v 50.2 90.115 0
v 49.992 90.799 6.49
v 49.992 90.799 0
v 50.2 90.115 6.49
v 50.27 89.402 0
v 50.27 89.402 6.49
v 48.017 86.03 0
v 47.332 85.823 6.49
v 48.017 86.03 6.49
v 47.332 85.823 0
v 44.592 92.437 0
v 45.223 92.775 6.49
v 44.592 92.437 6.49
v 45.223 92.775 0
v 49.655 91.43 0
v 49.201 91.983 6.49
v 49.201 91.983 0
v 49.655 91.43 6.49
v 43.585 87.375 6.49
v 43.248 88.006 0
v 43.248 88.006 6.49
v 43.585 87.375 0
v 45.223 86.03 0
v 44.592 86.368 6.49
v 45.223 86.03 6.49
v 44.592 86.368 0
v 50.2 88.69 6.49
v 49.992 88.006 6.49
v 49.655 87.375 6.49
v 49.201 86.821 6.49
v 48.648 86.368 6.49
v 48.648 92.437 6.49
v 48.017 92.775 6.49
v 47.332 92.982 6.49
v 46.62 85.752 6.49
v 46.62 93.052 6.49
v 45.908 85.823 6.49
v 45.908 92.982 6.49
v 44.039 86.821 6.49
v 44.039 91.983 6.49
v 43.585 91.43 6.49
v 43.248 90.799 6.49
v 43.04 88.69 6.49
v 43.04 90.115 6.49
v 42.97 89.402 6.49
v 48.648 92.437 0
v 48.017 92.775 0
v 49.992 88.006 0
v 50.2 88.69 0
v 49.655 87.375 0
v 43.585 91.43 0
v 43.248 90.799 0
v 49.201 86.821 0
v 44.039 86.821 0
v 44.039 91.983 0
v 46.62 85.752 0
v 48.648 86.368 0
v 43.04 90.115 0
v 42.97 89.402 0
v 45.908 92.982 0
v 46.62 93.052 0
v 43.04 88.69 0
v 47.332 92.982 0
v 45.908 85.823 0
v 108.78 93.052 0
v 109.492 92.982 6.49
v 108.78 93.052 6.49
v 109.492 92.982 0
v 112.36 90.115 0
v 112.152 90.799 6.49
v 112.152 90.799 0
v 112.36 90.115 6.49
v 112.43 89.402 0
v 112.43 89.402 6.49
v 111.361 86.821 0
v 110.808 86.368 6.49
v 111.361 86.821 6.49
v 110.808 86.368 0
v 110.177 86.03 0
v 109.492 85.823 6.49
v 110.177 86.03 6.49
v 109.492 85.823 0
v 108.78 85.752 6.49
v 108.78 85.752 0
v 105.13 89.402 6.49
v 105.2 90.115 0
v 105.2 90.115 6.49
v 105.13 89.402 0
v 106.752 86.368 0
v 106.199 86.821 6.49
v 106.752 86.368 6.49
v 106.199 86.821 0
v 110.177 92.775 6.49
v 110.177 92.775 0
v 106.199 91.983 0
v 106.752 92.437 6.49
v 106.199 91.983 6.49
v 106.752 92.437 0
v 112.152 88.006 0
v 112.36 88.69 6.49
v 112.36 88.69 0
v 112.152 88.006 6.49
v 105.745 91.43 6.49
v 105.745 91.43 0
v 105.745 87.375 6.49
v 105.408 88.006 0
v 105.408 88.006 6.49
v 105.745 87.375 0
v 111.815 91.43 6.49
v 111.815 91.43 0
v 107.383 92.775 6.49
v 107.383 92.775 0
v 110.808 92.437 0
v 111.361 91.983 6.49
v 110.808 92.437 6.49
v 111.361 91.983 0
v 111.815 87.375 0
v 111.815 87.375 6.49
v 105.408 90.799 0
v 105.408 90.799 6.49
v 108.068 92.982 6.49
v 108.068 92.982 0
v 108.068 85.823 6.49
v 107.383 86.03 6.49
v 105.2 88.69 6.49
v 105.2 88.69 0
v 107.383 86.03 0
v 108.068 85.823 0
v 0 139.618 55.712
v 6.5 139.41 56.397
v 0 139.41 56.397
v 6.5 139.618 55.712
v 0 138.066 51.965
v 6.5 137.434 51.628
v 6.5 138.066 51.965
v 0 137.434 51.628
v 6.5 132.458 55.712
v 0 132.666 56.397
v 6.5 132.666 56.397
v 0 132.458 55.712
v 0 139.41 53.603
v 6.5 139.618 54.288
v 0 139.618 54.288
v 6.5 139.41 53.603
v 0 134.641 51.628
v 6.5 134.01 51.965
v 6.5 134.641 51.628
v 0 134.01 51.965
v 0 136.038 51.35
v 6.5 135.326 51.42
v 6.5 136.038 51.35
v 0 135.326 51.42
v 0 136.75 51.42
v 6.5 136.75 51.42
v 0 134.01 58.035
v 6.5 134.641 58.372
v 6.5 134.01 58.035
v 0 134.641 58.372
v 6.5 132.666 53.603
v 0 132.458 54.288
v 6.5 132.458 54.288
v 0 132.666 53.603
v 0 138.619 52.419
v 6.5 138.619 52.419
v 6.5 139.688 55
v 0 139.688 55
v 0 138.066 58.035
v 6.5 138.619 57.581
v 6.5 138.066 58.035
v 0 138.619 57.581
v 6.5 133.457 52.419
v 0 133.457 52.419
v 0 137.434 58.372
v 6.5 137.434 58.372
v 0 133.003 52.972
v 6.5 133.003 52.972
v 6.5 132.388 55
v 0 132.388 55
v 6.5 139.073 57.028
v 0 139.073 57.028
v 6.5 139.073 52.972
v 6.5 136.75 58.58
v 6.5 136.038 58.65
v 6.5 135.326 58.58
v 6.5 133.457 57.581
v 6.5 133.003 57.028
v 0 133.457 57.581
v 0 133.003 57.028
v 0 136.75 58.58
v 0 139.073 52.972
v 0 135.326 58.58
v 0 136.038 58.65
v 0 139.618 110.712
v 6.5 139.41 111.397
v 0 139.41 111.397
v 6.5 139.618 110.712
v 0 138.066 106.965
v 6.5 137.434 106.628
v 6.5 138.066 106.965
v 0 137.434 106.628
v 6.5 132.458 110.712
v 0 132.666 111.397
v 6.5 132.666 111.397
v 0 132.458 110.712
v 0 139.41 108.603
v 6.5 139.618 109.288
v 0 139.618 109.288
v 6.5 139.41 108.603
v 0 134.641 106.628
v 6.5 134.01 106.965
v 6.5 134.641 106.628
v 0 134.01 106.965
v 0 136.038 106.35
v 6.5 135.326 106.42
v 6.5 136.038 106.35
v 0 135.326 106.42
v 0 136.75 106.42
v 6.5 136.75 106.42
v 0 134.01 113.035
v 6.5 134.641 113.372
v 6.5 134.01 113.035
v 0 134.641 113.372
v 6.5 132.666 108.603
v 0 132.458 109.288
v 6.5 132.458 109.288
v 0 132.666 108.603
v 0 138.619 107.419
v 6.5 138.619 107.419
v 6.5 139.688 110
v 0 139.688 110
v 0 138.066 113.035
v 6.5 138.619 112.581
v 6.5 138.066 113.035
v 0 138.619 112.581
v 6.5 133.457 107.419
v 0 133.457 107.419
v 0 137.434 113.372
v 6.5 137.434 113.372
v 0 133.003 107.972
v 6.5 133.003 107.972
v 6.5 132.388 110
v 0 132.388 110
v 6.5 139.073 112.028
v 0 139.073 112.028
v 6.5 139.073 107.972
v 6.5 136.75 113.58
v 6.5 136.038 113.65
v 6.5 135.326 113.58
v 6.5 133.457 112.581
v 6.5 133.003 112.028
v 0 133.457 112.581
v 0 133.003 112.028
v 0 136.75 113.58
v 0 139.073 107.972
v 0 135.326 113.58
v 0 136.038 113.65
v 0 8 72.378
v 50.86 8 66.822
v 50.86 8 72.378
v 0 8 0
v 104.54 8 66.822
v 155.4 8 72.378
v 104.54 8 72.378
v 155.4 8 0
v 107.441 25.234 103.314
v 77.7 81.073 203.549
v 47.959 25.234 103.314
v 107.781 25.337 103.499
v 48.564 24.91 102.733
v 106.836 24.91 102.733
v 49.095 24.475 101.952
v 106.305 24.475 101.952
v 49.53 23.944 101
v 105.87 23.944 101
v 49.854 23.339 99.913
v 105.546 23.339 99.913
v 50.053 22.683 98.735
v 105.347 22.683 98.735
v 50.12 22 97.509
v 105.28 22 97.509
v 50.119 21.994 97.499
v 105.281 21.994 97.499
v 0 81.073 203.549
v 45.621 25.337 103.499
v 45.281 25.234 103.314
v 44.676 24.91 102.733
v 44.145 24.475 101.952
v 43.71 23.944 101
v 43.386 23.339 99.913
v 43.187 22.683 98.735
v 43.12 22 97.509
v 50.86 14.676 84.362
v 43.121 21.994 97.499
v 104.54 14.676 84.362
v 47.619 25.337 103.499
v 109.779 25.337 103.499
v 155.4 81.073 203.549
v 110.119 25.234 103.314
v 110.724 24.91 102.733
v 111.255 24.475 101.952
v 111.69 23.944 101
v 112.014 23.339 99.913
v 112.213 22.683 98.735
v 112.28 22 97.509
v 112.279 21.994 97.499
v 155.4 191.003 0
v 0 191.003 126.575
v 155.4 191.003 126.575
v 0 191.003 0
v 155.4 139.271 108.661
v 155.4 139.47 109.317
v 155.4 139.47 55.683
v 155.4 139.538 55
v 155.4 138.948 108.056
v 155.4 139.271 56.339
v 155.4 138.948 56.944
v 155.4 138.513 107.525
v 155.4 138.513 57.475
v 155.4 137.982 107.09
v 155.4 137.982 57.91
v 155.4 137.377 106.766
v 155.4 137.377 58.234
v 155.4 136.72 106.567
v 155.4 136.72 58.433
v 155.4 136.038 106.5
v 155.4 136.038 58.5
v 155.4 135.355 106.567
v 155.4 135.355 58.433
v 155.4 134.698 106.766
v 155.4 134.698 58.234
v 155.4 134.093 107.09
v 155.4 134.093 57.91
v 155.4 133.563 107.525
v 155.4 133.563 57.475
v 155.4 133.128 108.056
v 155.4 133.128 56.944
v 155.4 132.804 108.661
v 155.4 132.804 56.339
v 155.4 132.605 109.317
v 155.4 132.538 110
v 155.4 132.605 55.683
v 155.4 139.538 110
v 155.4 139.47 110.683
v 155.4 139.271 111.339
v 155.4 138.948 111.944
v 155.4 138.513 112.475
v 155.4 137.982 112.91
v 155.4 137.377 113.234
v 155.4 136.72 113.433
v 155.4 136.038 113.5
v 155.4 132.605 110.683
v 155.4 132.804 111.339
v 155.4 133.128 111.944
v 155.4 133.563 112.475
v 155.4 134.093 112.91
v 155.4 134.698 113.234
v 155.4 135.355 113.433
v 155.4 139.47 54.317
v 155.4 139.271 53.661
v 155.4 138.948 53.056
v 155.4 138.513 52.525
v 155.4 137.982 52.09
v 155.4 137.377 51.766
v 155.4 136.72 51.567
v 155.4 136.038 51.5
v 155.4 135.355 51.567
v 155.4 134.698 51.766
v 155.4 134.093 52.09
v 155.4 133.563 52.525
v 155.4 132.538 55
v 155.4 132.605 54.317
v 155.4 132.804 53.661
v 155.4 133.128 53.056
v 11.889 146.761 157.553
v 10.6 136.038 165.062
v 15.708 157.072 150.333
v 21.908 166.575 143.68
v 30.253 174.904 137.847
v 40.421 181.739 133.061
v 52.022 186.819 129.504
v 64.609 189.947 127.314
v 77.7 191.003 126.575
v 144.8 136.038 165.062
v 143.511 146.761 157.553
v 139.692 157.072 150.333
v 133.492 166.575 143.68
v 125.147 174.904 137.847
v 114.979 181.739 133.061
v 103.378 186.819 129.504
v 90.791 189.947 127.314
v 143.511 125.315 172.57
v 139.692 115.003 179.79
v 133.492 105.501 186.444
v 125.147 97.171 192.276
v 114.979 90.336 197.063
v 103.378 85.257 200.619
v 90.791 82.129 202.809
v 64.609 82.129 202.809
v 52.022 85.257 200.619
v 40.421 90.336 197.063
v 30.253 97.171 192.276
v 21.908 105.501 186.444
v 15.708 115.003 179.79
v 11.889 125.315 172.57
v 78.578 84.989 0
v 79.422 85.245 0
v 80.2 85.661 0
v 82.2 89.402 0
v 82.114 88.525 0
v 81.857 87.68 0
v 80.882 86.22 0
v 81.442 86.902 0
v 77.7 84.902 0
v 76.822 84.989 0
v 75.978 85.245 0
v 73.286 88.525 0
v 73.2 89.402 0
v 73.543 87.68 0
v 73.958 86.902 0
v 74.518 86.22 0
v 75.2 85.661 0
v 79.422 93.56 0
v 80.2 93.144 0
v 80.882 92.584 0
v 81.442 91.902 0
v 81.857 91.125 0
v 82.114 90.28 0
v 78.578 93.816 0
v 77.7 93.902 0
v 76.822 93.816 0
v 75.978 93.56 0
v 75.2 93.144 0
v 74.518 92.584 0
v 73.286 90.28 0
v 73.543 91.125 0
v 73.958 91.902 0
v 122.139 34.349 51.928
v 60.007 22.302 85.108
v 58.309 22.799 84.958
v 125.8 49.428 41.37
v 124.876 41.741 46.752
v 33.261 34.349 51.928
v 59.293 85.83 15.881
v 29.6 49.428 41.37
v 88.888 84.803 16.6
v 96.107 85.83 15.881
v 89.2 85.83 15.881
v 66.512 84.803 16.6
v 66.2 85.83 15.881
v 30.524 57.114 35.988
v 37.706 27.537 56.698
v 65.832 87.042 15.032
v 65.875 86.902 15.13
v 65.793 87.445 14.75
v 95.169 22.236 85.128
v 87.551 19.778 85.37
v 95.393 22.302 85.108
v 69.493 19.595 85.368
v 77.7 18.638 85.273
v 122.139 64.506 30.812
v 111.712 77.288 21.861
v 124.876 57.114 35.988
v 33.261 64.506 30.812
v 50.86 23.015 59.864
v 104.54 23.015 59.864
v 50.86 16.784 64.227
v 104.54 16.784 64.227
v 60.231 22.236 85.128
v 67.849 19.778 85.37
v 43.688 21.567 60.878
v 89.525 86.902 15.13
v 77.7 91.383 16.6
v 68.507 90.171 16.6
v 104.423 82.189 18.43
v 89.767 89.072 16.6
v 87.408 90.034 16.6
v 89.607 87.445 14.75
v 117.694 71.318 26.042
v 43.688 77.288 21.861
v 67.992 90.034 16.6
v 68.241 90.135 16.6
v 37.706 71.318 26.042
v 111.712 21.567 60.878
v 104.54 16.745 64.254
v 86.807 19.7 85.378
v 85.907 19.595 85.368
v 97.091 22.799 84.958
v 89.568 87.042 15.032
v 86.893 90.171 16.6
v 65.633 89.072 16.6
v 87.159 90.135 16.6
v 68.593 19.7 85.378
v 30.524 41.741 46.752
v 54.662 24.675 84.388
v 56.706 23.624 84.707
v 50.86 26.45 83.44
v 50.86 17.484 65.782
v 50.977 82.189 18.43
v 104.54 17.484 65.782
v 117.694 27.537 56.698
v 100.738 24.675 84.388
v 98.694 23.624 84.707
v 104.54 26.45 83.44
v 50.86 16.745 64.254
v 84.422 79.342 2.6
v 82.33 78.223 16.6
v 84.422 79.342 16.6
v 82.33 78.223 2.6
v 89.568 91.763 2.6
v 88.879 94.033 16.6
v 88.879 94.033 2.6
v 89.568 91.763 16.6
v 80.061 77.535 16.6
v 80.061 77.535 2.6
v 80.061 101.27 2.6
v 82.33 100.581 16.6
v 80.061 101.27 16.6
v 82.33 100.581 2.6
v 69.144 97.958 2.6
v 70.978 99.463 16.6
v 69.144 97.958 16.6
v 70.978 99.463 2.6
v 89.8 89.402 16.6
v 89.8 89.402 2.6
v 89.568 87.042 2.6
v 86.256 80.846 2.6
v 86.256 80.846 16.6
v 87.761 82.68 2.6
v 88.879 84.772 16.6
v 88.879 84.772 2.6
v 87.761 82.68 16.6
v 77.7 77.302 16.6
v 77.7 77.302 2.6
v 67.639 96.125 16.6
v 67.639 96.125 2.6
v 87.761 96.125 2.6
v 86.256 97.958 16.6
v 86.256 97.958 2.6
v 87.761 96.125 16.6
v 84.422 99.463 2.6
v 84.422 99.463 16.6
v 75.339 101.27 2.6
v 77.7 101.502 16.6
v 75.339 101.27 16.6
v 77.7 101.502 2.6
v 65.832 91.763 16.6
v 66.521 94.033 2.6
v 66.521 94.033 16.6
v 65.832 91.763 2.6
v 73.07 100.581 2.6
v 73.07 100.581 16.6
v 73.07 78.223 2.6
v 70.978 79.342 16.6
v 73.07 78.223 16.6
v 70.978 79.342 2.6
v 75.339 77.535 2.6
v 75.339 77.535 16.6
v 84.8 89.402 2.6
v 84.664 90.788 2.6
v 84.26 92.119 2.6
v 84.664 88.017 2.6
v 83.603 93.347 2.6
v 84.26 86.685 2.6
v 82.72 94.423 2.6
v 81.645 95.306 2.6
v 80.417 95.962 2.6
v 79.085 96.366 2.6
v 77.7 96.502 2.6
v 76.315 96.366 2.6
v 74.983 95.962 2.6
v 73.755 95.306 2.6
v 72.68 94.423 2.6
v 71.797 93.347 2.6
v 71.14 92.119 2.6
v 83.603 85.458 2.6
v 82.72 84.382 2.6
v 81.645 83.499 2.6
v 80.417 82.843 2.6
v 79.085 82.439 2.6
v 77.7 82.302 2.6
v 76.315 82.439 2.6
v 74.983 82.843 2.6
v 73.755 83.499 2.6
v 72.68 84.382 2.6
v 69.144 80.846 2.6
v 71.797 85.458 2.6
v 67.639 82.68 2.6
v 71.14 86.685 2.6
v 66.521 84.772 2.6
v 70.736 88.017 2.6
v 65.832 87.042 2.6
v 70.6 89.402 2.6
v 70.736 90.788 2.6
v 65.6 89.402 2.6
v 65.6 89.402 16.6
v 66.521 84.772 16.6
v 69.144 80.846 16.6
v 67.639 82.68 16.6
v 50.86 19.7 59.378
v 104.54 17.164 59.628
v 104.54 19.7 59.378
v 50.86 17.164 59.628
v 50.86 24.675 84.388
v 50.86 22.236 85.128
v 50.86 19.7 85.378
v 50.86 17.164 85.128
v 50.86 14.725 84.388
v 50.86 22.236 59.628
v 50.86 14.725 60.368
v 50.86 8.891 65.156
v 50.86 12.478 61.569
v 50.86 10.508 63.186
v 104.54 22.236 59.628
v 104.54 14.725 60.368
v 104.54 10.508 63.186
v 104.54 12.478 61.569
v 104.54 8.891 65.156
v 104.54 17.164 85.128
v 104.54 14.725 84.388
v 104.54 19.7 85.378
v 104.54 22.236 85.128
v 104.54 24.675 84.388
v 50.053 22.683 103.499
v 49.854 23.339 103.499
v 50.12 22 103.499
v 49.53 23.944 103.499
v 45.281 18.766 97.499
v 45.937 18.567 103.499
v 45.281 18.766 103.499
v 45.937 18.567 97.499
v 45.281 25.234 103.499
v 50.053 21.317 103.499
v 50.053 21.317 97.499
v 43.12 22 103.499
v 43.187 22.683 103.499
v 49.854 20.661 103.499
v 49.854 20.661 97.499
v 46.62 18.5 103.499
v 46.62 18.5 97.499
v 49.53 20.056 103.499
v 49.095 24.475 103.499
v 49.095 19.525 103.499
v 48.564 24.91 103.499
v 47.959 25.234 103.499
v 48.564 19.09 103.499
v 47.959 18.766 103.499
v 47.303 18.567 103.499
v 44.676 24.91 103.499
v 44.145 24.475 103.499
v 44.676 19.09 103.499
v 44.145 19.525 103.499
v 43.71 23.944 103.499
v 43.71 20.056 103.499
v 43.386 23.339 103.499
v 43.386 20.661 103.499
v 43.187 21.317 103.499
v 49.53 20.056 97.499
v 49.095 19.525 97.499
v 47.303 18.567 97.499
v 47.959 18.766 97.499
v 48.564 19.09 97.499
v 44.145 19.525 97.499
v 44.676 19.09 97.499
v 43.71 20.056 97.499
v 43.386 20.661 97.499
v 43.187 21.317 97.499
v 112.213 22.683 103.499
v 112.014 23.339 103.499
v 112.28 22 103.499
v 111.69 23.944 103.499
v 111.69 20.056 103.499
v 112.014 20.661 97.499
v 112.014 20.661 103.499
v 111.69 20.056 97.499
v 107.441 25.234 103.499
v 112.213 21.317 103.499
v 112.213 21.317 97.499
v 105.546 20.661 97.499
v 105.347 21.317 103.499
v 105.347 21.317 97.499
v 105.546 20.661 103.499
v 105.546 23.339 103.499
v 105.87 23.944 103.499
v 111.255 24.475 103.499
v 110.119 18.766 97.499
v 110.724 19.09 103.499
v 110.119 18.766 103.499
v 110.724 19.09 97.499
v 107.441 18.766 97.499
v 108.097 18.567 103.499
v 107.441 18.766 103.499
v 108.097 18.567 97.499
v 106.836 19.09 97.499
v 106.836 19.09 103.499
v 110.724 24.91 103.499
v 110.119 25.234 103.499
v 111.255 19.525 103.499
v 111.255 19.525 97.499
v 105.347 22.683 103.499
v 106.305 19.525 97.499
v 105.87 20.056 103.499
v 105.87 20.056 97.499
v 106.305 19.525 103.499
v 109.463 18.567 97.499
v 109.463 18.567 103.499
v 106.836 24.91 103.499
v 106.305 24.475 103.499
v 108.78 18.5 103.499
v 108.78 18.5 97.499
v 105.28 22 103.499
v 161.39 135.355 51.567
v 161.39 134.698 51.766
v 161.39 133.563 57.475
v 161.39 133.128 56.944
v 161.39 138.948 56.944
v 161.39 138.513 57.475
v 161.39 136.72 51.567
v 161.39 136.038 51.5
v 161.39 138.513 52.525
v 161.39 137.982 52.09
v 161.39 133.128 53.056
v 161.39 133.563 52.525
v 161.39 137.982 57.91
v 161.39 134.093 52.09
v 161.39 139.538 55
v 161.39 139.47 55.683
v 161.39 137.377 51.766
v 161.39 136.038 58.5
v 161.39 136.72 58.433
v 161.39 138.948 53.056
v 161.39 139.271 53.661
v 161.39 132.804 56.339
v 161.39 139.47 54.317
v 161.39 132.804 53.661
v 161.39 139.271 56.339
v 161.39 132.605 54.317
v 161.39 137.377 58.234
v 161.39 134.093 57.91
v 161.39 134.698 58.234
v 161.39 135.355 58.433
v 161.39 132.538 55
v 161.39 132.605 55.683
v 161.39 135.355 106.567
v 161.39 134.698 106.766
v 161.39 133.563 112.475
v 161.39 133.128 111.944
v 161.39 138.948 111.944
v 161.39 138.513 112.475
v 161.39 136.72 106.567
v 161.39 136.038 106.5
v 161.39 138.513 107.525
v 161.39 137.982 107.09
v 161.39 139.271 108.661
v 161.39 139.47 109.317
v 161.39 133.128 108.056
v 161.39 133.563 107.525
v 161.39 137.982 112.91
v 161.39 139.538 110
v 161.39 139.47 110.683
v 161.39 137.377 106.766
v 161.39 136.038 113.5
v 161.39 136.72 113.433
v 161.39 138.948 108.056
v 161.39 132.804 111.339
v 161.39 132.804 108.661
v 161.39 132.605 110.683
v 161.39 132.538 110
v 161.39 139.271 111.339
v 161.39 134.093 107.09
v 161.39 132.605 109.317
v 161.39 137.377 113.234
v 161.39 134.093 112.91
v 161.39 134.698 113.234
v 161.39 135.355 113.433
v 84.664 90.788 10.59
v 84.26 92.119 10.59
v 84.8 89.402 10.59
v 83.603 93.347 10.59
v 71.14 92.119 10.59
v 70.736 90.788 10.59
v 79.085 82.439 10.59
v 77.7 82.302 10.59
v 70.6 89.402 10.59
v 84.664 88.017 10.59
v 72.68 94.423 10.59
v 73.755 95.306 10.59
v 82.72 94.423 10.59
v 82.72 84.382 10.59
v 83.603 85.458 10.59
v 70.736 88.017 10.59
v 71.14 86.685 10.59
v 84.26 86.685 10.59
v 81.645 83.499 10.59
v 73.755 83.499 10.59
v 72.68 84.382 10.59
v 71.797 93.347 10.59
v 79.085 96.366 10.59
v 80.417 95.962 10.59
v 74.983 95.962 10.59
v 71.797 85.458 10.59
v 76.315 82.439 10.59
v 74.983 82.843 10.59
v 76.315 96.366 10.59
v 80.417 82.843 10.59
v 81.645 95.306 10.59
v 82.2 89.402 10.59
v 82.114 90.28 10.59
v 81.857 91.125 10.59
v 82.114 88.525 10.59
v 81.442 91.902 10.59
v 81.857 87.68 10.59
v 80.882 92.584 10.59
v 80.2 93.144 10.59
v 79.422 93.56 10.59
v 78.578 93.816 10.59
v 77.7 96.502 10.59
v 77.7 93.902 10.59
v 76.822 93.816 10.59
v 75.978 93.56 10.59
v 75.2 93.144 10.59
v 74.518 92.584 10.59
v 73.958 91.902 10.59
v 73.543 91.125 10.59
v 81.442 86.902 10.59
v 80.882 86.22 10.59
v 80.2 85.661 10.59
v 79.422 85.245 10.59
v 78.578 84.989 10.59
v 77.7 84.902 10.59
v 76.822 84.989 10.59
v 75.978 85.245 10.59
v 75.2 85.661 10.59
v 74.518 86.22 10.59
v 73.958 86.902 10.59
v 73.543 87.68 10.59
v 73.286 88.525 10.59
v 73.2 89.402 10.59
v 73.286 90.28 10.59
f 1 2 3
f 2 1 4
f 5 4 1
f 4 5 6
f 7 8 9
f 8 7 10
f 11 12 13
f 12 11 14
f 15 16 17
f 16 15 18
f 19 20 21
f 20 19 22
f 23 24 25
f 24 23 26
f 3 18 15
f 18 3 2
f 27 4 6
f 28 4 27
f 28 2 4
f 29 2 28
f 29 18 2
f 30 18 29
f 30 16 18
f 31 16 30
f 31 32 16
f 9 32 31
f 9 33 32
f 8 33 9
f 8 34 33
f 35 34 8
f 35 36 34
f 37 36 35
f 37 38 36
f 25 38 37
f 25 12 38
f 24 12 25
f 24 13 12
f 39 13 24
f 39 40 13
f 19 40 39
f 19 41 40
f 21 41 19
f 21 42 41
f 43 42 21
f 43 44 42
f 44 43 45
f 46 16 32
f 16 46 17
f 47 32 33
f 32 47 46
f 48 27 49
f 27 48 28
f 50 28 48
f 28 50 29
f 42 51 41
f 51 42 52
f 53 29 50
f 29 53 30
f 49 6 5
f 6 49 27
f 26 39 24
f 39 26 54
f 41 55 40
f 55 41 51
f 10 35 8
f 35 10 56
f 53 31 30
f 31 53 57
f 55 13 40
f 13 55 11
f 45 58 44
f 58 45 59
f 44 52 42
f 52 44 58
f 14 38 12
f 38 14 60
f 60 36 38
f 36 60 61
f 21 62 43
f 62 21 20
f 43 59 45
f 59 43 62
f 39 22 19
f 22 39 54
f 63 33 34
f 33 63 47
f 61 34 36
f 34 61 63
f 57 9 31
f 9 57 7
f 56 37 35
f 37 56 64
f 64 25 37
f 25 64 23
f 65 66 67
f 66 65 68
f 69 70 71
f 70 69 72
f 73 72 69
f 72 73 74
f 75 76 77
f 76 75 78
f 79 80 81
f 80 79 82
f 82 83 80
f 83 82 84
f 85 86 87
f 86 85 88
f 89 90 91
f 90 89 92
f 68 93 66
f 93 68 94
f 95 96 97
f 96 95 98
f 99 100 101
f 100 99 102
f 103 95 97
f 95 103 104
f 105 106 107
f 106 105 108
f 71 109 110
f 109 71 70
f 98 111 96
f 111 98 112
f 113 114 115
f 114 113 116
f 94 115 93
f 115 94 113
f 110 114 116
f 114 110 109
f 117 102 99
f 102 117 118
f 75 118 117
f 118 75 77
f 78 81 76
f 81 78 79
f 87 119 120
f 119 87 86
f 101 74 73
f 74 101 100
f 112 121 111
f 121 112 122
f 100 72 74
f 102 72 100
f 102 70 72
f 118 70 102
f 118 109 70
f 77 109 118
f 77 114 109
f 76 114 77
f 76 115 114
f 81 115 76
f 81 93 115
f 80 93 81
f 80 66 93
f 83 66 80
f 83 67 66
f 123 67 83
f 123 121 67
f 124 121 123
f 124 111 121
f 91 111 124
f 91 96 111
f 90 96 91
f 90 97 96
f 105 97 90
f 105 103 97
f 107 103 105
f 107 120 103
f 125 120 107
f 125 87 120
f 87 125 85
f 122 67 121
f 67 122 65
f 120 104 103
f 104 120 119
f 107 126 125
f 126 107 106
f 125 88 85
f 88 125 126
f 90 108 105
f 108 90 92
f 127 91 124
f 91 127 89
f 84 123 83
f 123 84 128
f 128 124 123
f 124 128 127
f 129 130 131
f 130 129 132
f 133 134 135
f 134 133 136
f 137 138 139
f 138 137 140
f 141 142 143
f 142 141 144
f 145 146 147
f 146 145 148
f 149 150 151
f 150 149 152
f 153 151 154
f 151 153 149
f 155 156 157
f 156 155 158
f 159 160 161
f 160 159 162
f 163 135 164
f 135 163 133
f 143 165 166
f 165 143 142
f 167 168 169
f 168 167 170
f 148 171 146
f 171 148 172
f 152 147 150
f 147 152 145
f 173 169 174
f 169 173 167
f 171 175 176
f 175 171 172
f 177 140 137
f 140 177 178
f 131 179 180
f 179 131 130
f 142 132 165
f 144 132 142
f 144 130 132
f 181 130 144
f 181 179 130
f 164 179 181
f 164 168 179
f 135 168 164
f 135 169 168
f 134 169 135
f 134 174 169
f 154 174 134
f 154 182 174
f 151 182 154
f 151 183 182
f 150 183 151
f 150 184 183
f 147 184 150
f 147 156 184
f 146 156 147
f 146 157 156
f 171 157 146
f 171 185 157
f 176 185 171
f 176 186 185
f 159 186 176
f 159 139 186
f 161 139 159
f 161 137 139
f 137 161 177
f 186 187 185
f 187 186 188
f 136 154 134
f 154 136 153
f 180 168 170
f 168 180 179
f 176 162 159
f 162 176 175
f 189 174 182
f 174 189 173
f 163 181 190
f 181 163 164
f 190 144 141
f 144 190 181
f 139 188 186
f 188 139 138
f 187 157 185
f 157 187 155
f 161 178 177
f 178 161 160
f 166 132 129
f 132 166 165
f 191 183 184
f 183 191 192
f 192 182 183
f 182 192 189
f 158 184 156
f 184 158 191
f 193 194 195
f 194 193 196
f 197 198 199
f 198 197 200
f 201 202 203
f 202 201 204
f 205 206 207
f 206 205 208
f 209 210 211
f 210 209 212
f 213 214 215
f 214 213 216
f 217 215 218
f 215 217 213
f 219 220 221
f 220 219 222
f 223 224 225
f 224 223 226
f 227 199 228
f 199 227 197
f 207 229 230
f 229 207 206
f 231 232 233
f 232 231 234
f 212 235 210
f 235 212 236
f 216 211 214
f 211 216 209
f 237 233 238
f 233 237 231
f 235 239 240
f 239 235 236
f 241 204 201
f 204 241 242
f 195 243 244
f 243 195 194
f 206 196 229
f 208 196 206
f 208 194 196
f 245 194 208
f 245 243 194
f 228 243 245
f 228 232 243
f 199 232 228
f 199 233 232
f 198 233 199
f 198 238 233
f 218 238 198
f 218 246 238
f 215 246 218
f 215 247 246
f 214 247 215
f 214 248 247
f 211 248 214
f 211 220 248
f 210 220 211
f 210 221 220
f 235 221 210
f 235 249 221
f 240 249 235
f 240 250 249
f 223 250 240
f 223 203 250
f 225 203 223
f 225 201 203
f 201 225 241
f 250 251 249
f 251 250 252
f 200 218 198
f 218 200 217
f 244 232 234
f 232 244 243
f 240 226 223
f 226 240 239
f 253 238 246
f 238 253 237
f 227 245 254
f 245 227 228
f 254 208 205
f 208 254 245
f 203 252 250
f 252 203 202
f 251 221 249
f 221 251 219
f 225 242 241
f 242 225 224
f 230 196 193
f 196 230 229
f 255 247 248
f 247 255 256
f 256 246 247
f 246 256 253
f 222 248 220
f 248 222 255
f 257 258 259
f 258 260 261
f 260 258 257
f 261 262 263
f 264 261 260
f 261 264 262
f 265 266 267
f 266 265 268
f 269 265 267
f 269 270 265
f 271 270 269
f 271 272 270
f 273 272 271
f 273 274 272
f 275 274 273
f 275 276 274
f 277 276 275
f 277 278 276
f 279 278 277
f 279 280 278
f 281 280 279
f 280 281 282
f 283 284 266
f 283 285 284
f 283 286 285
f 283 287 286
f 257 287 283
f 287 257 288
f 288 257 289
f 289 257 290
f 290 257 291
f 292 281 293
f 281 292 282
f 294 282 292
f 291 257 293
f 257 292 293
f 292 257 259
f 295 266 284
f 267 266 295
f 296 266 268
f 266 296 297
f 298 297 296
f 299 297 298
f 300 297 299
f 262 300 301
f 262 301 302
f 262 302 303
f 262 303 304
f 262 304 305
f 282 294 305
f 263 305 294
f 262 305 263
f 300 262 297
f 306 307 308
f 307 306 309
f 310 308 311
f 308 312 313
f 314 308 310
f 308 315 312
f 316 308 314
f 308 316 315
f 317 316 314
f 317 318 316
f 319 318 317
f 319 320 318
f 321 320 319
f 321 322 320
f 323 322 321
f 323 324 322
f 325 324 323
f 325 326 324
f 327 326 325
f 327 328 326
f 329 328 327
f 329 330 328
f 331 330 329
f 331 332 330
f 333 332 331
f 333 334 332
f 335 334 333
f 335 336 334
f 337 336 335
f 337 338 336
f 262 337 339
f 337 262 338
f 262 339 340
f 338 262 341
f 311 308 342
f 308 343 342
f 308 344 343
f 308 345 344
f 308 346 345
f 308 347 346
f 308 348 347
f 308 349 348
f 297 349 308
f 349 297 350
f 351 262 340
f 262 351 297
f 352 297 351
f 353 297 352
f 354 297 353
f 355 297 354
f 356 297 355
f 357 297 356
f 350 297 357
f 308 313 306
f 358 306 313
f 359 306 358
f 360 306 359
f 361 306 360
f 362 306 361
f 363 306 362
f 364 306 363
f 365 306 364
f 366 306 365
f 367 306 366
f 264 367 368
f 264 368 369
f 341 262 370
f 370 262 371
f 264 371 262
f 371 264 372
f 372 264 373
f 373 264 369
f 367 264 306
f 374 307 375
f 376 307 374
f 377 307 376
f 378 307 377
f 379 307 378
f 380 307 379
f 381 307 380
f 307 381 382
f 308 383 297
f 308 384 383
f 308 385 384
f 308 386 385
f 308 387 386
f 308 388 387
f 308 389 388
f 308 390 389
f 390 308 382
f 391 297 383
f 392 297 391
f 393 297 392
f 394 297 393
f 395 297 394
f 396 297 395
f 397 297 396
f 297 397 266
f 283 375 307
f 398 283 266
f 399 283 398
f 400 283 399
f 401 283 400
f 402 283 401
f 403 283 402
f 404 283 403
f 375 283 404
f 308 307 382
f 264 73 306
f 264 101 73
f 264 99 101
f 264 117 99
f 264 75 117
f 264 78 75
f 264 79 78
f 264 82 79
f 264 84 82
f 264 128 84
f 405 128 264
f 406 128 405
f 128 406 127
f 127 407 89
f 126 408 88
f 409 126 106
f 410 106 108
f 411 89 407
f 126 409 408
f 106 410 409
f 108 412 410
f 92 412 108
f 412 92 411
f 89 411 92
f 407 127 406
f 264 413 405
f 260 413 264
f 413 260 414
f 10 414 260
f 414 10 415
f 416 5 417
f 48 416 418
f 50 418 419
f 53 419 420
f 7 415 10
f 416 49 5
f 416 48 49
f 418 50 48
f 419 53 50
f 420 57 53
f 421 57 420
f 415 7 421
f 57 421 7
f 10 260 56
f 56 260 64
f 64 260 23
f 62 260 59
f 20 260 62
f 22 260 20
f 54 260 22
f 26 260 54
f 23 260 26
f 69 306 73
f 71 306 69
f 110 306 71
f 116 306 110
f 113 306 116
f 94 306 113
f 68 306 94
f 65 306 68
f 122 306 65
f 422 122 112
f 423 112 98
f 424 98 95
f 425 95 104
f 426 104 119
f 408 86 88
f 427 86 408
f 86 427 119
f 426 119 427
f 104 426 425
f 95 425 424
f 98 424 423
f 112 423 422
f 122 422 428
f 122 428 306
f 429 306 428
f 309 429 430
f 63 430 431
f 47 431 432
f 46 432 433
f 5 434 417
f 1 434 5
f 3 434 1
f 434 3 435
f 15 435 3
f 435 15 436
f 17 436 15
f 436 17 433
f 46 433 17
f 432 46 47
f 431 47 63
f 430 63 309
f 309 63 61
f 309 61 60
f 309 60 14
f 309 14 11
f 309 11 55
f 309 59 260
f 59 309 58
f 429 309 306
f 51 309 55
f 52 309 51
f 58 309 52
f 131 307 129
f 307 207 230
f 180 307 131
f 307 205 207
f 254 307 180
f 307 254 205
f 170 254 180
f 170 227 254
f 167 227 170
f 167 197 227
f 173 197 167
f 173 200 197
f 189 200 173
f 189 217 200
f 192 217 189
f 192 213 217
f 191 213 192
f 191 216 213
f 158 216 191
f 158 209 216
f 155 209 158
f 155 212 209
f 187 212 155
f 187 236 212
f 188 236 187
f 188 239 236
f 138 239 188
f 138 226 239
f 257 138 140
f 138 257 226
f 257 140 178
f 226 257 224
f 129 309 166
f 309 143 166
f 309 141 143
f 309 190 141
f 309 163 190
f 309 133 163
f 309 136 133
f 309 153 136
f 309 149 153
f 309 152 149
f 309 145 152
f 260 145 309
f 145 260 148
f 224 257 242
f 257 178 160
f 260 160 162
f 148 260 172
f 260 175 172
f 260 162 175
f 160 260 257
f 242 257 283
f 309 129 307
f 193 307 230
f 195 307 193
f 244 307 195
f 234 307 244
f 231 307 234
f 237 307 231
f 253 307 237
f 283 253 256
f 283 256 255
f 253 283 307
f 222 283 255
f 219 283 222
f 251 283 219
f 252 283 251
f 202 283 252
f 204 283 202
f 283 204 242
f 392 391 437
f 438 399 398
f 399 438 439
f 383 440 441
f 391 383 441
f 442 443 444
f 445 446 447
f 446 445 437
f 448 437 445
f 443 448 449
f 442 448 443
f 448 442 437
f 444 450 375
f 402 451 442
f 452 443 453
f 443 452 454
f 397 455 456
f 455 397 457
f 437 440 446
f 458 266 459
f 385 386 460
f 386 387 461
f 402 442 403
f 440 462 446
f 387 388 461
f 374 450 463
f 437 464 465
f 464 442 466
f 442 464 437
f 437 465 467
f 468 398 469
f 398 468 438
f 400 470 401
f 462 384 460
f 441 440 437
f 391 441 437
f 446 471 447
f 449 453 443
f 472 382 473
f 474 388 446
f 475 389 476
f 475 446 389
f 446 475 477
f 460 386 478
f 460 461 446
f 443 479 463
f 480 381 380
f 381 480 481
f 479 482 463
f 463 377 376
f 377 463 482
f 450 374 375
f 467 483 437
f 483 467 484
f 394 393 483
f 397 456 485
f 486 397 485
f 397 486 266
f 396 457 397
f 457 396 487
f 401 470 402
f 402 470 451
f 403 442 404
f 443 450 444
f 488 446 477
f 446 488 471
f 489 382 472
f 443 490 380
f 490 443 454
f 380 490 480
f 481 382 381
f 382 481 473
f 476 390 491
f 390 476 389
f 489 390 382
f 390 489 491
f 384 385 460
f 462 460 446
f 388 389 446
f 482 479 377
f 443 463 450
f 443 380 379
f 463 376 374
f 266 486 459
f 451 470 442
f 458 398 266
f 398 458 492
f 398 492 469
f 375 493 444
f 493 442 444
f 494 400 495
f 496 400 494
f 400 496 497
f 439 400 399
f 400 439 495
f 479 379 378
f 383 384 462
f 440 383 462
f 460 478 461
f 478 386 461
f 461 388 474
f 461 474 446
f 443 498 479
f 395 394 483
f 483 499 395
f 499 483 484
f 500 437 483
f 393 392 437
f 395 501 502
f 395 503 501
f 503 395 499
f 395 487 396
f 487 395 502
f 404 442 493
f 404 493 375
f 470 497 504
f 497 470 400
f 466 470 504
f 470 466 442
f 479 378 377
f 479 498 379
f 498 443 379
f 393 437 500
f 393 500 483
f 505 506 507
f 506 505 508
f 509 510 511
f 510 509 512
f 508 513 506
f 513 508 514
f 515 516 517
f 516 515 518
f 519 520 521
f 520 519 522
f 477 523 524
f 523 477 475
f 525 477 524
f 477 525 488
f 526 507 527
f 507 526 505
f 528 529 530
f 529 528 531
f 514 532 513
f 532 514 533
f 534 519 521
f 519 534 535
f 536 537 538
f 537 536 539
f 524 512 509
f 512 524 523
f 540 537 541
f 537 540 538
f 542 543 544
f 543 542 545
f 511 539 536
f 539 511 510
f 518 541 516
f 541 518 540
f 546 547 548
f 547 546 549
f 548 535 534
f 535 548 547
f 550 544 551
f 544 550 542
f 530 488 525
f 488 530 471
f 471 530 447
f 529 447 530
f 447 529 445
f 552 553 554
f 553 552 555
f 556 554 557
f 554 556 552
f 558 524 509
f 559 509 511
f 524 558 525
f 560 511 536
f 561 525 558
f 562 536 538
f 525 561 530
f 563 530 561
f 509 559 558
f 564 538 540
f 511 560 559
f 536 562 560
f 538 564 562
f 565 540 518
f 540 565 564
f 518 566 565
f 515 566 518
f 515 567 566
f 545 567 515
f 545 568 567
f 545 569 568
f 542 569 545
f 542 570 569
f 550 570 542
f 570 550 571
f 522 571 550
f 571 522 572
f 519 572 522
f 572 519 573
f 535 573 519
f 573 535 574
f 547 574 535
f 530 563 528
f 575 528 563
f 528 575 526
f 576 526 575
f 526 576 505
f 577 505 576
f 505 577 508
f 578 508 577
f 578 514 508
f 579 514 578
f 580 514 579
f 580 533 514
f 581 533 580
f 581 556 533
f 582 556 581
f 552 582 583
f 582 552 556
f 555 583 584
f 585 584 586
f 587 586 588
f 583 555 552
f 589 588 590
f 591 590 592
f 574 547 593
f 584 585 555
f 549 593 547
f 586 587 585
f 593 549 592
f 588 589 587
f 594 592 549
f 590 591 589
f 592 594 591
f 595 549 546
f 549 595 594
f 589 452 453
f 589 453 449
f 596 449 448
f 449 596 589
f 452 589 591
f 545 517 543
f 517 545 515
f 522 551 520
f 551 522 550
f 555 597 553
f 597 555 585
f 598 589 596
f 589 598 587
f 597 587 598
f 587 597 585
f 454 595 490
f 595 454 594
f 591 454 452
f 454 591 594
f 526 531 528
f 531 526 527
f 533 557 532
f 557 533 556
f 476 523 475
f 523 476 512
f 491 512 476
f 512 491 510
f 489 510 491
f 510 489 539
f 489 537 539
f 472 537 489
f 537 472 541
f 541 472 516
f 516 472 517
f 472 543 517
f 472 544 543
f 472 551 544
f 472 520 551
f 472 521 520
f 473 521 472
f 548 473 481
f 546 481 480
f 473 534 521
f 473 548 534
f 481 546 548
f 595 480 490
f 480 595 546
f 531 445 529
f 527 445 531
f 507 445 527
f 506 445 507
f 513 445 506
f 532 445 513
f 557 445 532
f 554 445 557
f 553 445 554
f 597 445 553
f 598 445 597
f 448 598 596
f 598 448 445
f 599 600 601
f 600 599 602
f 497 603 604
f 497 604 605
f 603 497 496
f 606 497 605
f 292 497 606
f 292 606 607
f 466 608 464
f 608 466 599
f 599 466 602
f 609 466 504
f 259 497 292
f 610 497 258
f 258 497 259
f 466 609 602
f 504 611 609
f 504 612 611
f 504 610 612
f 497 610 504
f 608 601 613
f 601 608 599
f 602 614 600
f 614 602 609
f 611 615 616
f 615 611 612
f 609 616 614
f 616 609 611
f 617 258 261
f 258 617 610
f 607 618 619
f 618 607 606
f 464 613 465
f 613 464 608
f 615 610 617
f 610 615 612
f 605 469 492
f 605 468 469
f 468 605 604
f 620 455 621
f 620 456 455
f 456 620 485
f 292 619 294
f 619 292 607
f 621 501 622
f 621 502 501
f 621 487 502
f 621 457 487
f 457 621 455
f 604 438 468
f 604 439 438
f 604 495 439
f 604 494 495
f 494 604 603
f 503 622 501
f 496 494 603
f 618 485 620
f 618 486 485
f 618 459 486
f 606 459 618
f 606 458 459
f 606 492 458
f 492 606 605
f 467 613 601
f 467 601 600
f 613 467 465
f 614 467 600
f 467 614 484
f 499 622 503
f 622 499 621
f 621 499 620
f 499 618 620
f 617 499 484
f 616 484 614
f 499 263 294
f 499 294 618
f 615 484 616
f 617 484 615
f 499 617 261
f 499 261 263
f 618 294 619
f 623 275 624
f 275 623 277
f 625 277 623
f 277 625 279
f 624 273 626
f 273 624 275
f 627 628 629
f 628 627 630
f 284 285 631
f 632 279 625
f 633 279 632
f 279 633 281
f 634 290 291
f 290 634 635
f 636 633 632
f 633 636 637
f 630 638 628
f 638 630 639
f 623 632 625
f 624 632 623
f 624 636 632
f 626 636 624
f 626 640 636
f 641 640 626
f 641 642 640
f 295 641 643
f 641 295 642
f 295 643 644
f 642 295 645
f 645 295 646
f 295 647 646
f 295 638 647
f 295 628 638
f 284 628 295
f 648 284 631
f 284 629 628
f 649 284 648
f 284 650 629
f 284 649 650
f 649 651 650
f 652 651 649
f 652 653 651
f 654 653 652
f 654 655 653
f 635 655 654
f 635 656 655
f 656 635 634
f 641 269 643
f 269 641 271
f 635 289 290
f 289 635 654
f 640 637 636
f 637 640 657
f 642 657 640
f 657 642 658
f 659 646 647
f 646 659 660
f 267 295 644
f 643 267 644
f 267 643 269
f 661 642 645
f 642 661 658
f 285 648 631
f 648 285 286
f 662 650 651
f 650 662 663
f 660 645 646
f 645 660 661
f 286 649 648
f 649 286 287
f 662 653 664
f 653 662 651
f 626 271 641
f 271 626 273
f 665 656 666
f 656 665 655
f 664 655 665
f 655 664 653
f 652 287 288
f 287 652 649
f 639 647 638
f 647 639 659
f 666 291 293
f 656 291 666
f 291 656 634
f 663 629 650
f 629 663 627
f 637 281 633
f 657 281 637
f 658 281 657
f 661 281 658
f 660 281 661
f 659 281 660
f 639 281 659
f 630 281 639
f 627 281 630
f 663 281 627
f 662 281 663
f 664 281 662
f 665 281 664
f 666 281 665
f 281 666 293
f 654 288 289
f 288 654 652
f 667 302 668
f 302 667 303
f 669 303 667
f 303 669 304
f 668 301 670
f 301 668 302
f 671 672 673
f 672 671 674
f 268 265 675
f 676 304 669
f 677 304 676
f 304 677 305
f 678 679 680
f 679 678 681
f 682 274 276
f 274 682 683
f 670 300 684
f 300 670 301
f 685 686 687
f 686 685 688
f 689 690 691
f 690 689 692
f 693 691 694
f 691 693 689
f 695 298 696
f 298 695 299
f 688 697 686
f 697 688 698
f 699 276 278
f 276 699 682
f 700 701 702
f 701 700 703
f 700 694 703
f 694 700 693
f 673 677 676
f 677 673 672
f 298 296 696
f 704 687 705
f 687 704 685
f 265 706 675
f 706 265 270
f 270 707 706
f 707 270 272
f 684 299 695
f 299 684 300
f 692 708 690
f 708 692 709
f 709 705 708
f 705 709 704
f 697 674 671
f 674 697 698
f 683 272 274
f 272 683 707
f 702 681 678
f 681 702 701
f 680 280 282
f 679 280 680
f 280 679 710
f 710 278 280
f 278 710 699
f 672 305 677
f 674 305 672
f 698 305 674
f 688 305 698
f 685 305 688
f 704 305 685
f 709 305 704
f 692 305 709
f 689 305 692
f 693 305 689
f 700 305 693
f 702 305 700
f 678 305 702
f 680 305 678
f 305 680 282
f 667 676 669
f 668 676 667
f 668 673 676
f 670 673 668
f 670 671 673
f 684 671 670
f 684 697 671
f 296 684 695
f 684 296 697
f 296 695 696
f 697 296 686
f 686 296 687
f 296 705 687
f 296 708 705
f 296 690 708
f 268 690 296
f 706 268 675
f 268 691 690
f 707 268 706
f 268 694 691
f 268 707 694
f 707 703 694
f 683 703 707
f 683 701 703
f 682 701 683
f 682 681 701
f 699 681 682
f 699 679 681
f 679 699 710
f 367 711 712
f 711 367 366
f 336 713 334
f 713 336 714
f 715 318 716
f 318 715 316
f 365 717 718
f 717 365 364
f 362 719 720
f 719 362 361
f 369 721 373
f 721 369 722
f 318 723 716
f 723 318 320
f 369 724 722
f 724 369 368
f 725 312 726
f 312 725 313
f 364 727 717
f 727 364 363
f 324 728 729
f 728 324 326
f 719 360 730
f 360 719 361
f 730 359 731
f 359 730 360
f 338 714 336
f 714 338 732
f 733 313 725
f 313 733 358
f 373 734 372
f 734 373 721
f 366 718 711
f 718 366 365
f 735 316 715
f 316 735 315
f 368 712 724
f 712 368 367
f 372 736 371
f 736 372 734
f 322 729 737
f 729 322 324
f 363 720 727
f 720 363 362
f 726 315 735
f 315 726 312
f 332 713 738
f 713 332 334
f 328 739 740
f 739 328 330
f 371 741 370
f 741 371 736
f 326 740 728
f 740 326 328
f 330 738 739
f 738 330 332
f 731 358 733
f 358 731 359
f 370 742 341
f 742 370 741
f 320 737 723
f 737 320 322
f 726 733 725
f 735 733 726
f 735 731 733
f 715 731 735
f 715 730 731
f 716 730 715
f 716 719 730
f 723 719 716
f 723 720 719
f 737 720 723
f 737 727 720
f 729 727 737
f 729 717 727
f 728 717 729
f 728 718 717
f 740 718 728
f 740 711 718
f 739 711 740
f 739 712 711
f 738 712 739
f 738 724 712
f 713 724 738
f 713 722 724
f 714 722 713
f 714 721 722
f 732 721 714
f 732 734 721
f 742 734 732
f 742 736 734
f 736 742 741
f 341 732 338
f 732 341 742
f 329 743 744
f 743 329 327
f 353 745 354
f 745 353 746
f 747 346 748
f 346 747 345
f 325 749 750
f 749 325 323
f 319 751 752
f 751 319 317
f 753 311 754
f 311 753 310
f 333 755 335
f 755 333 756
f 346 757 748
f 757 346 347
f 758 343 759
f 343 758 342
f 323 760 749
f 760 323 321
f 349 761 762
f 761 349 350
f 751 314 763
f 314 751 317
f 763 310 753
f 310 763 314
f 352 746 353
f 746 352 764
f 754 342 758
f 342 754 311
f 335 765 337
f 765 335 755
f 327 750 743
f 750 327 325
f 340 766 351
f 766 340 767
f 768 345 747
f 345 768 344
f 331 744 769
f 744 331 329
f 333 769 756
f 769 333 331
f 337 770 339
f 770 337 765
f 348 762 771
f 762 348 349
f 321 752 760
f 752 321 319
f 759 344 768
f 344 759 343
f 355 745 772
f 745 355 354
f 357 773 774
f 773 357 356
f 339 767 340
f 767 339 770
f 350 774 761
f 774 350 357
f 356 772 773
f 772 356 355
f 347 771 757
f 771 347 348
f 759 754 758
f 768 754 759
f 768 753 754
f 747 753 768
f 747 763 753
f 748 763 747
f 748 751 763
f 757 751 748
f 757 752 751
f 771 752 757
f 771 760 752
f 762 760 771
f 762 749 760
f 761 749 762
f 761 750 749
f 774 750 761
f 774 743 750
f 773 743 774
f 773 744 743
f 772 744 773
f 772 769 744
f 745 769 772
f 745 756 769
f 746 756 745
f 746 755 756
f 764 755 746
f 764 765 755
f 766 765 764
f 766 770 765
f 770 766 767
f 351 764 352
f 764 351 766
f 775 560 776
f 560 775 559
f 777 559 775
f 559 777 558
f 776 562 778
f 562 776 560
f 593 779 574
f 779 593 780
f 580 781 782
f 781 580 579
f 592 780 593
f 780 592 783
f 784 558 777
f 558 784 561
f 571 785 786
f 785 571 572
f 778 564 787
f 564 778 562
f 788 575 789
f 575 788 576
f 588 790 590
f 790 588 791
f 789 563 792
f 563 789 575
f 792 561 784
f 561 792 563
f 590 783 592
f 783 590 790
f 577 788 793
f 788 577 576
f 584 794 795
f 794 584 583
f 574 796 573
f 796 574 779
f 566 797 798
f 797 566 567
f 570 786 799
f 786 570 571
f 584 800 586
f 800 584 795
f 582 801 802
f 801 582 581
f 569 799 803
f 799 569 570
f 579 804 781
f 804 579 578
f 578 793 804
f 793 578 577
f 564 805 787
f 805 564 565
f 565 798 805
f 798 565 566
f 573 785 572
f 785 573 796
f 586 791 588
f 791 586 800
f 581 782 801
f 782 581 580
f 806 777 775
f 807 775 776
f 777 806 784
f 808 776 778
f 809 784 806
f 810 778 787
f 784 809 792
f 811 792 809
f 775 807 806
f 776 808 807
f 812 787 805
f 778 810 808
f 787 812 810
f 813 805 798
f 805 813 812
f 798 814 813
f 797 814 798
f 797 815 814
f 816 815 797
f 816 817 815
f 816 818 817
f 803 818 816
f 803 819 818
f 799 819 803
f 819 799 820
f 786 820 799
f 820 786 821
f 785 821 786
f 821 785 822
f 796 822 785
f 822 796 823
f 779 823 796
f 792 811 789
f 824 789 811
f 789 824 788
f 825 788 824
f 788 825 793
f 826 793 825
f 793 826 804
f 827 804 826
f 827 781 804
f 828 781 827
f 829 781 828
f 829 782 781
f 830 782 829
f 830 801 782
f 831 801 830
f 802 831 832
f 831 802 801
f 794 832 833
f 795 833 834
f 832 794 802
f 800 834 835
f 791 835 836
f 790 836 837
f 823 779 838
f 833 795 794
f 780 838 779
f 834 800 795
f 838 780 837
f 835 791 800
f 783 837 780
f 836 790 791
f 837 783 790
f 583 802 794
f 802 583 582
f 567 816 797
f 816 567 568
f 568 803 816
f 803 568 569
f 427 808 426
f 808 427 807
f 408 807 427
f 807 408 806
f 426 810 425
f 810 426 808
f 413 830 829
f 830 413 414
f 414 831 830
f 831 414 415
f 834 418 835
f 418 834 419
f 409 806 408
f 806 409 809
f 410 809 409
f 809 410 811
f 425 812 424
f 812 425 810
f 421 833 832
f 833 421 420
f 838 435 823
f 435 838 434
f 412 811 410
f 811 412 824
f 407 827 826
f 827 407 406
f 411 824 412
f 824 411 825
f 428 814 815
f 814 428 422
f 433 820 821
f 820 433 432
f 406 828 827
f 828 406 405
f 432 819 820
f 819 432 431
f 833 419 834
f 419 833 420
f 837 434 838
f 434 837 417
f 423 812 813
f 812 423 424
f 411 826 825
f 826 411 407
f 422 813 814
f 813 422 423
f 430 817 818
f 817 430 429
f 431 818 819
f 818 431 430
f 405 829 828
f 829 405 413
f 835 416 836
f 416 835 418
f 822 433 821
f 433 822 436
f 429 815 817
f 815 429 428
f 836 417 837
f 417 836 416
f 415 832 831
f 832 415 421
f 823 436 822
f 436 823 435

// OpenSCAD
// =====================================================================
//  模块化墙面种植系统 v4 — 单盆位托座 (OpenSCAD)
//  对标参考剖面图: 斜置可拆锥形花盆 + 盆底排水 + 储水沟+溢流 + 堆叠拼接
//  *省料楔形外壳 + 沿花盆角度斜切的洁净开口*
//    开口面 ⟂ 花盆轴线(沿盆倾角切), 是完整正圆、不被腔壁遮挡; 顶/前随盆斜切去废料。
//  打印机: 拓竹 P2S (256^3, 按 ≤240/轴) | 单件 1 个盆位
//  单位 mm | FDM 可打印 | 改顶部参数即可调花盆/模块尺寸
// =====================================================================

/* [可拆花盆 Pot — 实测外形, 上大下小圆台] */
pot_top_d   = 131.2;  // 花盆上开口外径(宽端, 落在开口)
pot_bot_d   = 93.2;   // 花盆底外径(窄端, 落在后下方)
pot_height  = 148;    // 花盆高
fit_clear   = 1.5;    // 腔体单边间隙(直径方向 = +2*该值)

/* [杯腔姿态 Pose] */
pot_tilt    = 55;     // 杯腔轴线与水平的夹角(越大越竖立, 开口越朝前)

/* [模块网格 Grid] 单盆位 */
cols        = 1;
gap_x       = 8;      // 盆侧净壁余量

/* [箱体 Shell] */
wall        = 2.6;    // 壁厚(0.4 喷嘴约 6 层)
back_gap    = 8;      // 杯底窄端与背板净间隙
sump_clear  = 12;     // 杯腔最低点离箱内底余量(=储水沟深, 须 > water_h)
top_clear   = 12;     // 开口最高点到顶余量

/* [灌溉 Irrigation] */
vent_d      = 5;      // 透气孔径
vent_count  = 3;      // 透气孔数
overflow_d  = 9;      // 溢流标管内径
water_h     = 8;      // 储水沟水位(标管高, < sump_clear)

/* [顶部缺口 Notch] */
notch       = true;
notch_d     = 26;

/* [堆叠定位 Interlock] 仅堆叠, 非承重 */
loc_peg_d   = 7;
loc_h       = 6;
loc_clear   = 0.3;

dev = true;
$fn = dev ? 32 : 96;

// ---- 派生尺寸 ------------------------------------------------------
cav_top_d = pot_top_d + 2*fit_clear;
cav_bot_d = pot_bot_d + 2*fit_clear;
pot_depth = pot_height + 2;
pot_d     = cav_top_d;
r_top     = cav_top_d/2;
r_bot     = cav_bot_d/2;
st        = sin(pot_tilt);
ct        = cos(pot_tilt);

mod_w     = cols*(pot_d + gap_x) + gap_x + 2*wall;

// 锥腔宽端中心 (Cy, oz0): 由"后上点离背 back_gap"和"最低点离底 sump_clear"反推
floor_in_z = wall + sump_clear;
Cy  = wall + back_gap + pot_depth*ct + r_bot*st;   // 宽端中心 Y
oz0 = floor_in_z + pot_depth*st + r_bot*ct;        // 宽端中心 Z
floor_y = Cy - pot_depth*ct;                        // 窄端中心 Y
floor_z = oz0 - pot_depth*st;                       // 窄端中心 Z

// 锥腔侧剖 rim 点 (Y,Z): F=前/宽端开口, B=后/窄端
FTy = Cy - r_top*st;  FTz = oz0 + r_top*ct;   // 前-上(开口顶)
FBy = Cy + r_top*st;  FBz = oz0 - r_top*ct;   // 前-下(开口底, 最前)
BTy = floor_y - r_bot*st;  BTz = floor_z + r_bot*ct;  // 后-上
back_face = max(0, BTy - wall);               // 后竖壁外面 Y

// 杯腔最低点(储水沟/排水)
low_y = floor_y + r_bot*st;
low_z = floor_z - r_bot*ct;

mod_d = FBy;                       // 最前 = 开口底
mod_h = FTz + top_clear;           // 最高 = 开口顶 + 余量

function cx(i) = wall + gap_x + pot_d/2 + i*(pot_d+gap_x);
// 顶斜面(C→D)在某 Y 处的外表面 Z
function slope_z(y) = (BTz+wall) + (FTz-(BTz+wall))*(y-back_face)/(FTy-back_face);

// ---- 侧剖面(楔形+斜开口, 局部坐标 x=Y, y=Z)----------------------
module side_profile() {
    polygon([
        [FBy,       0      ],   // 前-底(最前下角)
        [back_face, 0      ],   // 后-底
        [back_face, BTz+wall],  // 后竖壁顶
        [FTy,       FTz    ],   // 顶斜面到开口顶
        [FBy,       FBz    ]    // 开口斜面到开口底, 再竖直回前-底
    ]);
}
module shell() {
    multmatrix([[0,0,1,0],[1,0,0,0],[0,1,0,0],[0,0,0,1]])
        linear_extrude(mod_w) side_profile();
}

// 花盆腔: 圆台, 宽端(d1)朝开口, 窄端(d2)在后下; 开口落在斜剖面上 → 洁净正圆
module pocket(i) {
    translate([cx(i), Cy, oz0])
        rotate([90 + pot_tilt, 0, 0])
            cylinder(h = pot_depth + 1, d1 = cav_top_d, d2 = cav_bot_d);
}

// ---- 主模块 -------------------------------------------------------
module unit() {
    difference() {
        union() {
            difference() {
                shell();

                // 1) 花盆腔(在斜剖面开洁净正圆)
                for (i=[0:cols-1]) pocket(i);

                // 2) 储水沟(竖直短腔, 与锥腔底重叠 → 排水且不封闭)
                translate([cx(0), low_y, wall])
                    cylinder(h = low_z + 2 - wall, d = overflow_d + 2*wall + 10);

                // 3) 透气孔(开口上沿后方, 竖直穿顶斜面进腔)
                for (i=[0:cols-1], k=[0:vent_count-1])
                    translate([cx(i) - pot_d/4 + k*(pot_d/4), FTy - 16, mod_h + 1])
                        cylinder(h = mod_h + 1 - (slope_z(FTy-16) - 8), d = vent_d);

                // 4) 顶后沿半圆缺口
                if (notch)
                    translate([mod_w/2, back_face + notch_d*0.45, BTz + wall])
                        rotate([0,90,0])
                            cylinder(h = pot_d*0.4, d = notch_d, center = true);

                // 5) 堆叠定位孔: 底面 + 左侧
                for (sx=[mod_w*0.3, mod_w*0.7])
                    translate([sx, low_y, -0.01])
                        cylinder(h = loc_h + 0.5, d = loc_peg_d + loc_clear);
                for (sz=[55, 110])
                    translate([-0.5, Cy, sz])
                        rotate([0,90,0]) cylinder(h = loc_h + 1, d = loc_peg_d + loc_clear);
            }

            // 6) 溢流标管(立在储水沟最低处, 顶=水位)
            translate([cx(0), low_y, wall - 0.01])
                cylinder(h = water_h, d = overflow_d + 2*wall);

            // 7) 堆叠定位销: 后顶斜面 + 右侧(销立在顶斜面上, 与上层底孔配合)
            for (sx=[mod_w*0.3, mod_w*0.7])
                translate([sx, back_face + 14, slope_z(back_face + 14) - 0.01])
                    cylinder(h = loc_h, d = loc_peg_d);
            for (sz=[55, 110])
                translate([mod_w - 0.01, Cy, sz])
                    rotate([0,90,0]) cylinder(h = loc_h, d = loc_peg_d);
        }

        // 8) 标管内孔贯穿到底(储水沟 → 下层; 底层塞橡胶塞)
        translate([cx(0), low_y, -0.5])
            cylinder(h = water_h + wall + 1, d = overflow_d);
    }
}

unit();
echo(str("模块外形 W x D x H = ", mod_w, " x ", mod_d, " x ", mod_h, " mm  (限 240)"));
echo(str("开口顶 FT=(", FTy, ",", FTz, ")  开口底 FB=(", FBy, ",", FBz, ")  后壁 Y=", back_face));
echo(str("杯腔最低点 Z = ", low_z));
